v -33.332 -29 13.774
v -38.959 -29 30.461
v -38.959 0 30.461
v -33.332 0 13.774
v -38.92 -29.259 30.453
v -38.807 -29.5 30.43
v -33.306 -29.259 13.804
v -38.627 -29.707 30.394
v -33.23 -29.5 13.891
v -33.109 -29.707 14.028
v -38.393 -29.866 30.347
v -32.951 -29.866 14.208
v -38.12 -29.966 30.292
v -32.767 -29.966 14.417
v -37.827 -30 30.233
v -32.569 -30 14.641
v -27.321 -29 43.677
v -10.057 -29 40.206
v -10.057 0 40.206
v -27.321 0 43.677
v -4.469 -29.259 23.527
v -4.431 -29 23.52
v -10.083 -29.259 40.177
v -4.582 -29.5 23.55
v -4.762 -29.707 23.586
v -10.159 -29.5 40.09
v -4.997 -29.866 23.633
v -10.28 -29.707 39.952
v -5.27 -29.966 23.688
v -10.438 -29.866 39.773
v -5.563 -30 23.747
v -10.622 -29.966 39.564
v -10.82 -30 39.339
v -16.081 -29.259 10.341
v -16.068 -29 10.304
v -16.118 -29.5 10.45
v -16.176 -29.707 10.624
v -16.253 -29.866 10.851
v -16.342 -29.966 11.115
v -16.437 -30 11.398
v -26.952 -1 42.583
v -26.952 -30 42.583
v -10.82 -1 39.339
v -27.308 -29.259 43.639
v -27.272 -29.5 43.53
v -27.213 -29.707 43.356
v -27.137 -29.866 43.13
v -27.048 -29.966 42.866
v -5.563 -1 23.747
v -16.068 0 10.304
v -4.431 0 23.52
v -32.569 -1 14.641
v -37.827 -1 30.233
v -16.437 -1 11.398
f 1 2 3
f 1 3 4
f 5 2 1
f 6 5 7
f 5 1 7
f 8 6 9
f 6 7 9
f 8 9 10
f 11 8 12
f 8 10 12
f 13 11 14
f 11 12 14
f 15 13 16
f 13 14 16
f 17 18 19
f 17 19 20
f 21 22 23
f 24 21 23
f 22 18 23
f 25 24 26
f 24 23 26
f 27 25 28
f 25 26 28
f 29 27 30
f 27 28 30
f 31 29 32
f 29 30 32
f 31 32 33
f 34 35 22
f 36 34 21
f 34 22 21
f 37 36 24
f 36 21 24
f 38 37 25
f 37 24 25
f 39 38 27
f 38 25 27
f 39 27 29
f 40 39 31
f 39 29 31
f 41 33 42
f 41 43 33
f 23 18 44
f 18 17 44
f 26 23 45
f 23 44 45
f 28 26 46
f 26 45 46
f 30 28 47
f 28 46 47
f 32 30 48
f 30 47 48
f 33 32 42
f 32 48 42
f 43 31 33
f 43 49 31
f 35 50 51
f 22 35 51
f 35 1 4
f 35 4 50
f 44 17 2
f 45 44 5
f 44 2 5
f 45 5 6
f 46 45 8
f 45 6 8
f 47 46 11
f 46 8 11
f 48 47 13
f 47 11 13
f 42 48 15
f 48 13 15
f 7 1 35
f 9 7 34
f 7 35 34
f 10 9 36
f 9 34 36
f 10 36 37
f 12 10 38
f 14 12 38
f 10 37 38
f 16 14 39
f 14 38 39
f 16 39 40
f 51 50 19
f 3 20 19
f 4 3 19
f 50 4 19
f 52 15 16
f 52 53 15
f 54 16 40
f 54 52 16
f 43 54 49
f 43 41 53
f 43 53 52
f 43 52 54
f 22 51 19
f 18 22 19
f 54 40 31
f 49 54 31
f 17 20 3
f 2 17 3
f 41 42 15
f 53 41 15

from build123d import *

# Parameters (mm, degrees)
F1_DEPTH = 30
F2_T     = -1
F3_R     = 0.99999


# Not quite as in the source:
# - a fillet or chamfer is up to 0.001 mm smaller than in the source, because OpenCascade refuses the exact size


with BuildPart() as f1:
    # F0 (on Front) → F1 (new body)
    with BuildSketch(Plane.XZ):
        Polygon((-16.0683598468, 10.3036999003), (-4.4305566599, 23.5195108458), (-10.0568830769, 40.2060495226), (-27.3210126808, 43.676777254), (-38.9588158677, 30.4609663085), (-33.3324894507, 13.7744276316), align=None)
    extrude(amount=F1_DEPTH)

    # F2
    f2_openings = [f1.faces().sort_by_distance(p)[0] for p in [
        (-21.694686, -30, 26.990239),
    ]]
    offset(amount=F2_T, openings=f2_openings)

    # F3 (radius 1 in the source; OpenCascade refuses exactly that, so slightly less here)
    f3_edges = [f1.edges().sort_by_distance(p)[0] for p in [
        (-18.688948, -30, 41.941413),
        (-7.24372, -30, 31.86278),
        (-10.249458, -30, 16.911605),
        (-24.700425, -30, 12.039064),
        (-36.145653, -30, 22.117697),
        (-33.139914, -30, 37.068872),
    ]]
    fillet(f3_edges, radius=F3_R)


solid = f1.part
